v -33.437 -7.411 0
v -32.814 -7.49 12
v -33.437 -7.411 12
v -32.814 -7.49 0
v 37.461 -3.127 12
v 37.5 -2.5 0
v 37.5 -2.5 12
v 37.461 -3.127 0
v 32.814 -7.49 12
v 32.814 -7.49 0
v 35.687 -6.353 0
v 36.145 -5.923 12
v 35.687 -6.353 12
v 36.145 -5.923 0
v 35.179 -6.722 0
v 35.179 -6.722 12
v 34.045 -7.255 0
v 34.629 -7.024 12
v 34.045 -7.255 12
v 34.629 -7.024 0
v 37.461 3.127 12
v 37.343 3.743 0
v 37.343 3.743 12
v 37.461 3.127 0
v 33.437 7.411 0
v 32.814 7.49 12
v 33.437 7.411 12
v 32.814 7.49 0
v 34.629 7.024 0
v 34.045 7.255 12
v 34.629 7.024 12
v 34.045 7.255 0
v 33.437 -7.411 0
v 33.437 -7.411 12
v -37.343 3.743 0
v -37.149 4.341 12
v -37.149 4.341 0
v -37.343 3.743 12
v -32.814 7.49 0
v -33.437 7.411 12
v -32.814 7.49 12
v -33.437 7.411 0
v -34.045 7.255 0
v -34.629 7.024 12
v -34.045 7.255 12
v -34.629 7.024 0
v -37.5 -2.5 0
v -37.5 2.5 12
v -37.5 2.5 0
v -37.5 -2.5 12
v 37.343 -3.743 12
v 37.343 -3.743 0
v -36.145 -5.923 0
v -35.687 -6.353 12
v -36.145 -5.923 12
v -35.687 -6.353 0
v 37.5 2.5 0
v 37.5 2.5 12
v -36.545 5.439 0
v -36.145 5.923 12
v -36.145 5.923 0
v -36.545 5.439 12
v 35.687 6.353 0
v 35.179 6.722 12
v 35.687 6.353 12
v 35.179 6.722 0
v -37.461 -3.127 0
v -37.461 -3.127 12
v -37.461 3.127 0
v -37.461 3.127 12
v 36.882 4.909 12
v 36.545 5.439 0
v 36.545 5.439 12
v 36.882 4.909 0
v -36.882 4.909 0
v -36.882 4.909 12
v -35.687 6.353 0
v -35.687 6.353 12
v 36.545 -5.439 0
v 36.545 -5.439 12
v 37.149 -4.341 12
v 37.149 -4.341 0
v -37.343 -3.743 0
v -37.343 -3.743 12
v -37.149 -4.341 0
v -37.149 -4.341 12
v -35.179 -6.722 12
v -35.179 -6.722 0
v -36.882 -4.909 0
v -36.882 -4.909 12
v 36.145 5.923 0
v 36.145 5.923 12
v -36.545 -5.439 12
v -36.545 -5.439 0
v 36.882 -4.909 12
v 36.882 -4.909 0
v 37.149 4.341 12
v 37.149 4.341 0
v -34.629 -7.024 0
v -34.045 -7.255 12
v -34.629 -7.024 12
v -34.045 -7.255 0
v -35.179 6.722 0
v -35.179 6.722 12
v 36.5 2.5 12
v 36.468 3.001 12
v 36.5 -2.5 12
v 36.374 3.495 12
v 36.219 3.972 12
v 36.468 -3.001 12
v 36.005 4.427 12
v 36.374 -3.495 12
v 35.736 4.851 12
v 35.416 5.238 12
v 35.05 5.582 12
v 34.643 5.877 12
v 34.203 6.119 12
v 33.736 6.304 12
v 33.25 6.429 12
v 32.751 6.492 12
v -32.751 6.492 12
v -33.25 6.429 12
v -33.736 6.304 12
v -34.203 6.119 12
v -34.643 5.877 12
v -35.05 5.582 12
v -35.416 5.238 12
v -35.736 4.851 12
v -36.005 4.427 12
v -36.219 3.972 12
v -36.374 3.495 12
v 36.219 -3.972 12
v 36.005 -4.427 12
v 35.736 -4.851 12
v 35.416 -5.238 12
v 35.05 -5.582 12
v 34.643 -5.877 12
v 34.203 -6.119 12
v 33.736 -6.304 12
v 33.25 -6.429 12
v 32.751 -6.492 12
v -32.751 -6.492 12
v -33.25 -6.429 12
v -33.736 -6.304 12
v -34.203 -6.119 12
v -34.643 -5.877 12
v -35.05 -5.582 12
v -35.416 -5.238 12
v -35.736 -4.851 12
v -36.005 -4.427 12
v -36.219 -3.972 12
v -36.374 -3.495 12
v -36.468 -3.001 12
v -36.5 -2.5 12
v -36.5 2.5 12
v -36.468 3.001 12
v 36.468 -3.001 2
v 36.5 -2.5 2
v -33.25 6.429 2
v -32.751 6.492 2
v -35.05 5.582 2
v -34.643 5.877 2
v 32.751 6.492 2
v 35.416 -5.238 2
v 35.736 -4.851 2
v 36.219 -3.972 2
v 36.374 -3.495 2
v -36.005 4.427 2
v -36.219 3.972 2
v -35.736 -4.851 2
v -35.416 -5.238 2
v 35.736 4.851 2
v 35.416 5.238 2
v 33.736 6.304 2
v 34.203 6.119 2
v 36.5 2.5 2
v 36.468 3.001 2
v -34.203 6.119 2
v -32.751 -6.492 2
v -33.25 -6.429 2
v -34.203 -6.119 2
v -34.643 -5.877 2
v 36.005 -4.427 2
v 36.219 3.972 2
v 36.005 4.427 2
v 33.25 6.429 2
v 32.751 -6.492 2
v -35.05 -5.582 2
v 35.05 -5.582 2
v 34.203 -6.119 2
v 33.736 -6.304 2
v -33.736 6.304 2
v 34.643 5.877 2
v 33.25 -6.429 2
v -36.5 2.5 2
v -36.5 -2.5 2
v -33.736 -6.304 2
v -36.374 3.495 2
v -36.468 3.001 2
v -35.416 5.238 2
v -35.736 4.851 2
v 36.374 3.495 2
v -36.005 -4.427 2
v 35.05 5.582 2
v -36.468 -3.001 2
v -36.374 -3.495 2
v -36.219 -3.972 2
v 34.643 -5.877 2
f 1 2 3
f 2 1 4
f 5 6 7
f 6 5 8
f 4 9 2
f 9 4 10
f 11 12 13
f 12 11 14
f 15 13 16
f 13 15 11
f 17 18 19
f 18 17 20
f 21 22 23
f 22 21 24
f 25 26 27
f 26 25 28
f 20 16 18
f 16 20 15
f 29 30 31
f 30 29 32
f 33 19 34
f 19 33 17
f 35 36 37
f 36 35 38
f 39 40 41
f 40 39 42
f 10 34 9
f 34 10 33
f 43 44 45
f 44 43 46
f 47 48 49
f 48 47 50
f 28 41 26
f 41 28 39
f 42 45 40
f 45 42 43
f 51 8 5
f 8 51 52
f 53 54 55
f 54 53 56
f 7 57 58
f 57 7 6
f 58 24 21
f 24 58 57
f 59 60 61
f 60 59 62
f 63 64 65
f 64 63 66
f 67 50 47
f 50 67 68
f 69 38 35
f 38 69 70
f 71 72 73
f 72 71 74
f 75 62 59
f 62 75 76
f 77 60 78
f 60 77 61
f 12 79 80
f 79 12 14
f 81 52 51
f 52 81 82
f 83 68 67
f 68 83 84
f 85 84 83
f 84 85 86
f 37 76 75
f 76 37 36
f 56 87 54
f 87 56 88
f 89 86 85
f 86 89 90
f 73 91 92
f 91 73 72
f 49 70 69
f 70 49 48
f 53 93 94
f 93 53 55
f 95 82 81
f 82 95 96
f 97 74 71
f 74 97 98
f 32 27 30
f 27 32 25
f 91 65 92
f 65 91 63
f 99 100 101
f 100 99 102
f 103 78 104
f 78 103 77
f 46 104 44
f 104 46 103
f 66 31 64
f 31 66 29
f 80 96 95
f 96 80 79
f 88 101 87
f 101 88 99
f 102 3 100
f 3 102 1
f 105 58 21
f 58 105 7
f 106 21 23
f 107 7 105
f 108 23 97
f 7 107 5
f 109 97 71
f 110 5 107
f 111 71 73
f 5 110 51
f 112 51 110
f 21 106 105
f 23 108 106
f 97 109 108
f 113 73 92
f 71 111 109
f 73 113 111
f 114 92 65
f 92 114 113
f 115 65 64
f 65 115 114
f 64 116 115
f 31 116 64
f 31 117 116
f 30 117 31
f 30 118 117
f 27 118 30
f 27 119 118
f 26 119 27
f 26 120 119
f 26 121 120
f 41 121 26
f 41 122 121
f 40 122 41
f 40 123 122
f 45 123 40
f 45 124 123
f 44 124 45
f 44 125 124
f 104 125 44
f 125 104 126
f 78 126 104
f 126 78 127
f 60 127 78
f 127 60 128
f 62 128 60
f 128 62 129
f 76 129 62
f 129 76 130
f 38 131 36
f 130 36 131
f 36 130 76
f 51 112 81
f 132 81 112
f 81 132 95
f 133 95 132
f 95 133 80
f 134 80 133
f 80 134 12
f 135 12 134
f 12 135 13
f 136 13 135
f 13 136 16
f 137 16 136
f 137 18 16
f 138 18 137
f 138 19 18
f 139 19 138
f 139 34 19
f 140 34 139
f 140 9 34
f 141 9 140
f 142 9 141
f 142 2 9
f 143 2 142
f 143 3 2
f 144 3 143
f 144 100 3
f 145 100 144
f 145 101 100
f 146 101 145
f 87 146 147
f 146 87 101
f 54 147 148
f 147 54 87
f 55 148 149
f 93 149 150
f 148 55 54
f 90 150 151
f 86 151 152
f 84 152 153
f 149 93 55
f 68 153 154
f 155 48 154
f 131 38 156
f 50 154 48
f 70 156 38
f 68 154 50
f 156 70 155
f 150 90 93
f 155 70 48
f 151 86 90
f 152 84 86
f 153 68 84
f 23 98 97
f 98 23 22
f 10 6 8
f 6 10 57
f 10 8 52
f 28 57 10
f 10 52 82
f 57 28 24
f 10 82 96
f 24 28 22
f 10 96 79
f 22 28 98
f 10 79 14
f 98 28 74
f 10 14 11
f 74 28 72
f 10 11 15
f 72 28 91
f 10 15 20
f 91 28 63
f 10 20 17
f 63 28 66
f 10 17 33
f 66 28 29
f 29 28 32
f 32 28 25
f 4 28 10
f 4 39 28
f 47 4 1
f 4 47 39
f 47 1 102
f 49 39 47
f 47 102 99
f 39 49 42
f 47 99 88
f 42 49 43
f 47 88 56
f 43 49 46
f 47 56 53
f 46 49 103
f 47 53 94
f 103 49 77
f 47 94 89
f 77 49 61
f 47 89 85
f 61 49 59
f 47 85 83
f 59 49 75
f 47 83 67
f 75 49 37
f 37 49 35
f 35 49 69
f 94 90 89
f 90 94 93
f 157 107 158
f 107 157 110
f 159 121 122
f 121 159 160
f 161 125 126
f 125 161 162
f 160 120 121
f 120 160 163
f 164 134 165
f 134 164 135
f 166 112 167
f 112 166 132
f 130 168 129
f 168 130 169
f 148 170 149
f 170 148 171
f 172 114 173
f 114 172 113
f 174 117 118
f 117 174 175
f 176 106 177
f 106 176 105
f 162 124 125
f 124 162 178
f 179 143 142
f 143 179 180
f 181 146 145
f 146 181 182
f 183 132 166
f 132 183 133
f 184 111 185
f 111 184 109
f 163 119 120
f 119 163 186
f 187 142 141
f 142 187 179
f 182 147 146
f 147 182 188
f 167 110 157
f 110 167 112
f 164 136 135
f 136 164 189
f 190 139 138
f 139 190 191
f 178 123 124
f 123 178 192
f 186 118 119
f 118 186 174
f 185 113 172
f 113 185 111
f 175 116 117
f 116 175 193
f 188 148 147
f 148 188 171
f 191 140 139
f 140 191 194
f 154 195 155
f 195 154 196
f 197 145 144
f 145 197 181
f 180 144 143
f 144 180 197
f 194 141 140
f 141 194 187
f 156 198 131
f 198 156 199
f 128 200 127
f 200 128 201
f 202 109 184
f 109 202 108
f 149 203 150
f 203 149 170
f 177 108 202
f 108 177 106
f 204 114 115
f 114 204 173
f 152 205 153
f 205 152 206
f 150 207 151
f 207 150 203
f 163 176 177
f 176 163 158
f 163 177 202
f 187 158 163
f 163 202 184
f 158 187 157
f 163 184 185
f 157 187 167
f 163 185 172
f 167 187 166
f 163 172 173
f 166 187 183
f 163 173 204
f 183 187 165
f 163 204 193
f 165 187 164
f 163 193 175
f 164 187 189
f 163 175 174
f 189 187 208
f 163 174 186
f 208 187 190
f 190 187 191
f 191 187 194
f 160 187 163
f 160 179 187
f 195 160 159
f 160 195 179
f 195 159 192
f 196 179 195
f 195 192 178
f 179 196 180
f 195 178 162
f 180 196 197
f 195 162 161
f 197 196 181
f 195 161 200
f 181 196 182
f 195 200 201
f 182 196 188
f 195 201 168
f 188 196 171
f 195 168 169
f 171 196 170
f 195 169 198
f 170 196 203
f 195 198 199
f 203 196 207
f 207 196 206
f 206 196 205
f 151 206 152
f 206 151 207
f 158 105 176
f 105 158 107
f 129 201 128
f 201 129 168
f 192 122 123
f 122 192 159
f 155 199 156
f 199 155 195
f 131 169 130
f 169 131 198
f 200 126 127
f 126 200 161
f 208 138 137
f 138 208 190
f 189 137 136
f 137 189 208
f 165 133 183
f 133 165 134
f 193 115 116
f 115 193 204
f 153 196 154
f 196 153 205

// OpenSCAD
$fn = 50;


difference() {
	union() {
		hull() {
			translate(v = [-32.5000000000, 2.5000000000, 0]) {
				cylinder(h = 12, r = 5);
			}
			translate(v = [32.5000000000, 2.5000000000, 0]) {
				cylinder(h = 12, r = 5);
			}
			translate(v = [-32.5000000000, -2.5000000000, 0]) {
				cylinder(h = 12, r = 5);
			}
			translate(v = [32.5000000000, -2.5000000000, 0]) {
				cylinder(h = 12, r = 5);
			}
		}
	}
	union() {
		translate(v = [0, 0, 2]) {
			hull() {
				translate(v = [-32.5000000000, 2.5000000000, 0]) {
					cylinder(h = 10, r = 4);
				}
				translate(v = [32.5000000000, 2.5000000000, 0]) {
					cylinder(h = 10, r = 4);
				}
				translate(v = [-32.5000000000, -2.5000000000, 0]) {
					cylinder(h = 10, r = 4);
				}
				translate(v = [32.5000000000, -2.5000000000, 0]) {
					cylinder(h = 10, r = 4);
				}
			}
		}
	}
}
